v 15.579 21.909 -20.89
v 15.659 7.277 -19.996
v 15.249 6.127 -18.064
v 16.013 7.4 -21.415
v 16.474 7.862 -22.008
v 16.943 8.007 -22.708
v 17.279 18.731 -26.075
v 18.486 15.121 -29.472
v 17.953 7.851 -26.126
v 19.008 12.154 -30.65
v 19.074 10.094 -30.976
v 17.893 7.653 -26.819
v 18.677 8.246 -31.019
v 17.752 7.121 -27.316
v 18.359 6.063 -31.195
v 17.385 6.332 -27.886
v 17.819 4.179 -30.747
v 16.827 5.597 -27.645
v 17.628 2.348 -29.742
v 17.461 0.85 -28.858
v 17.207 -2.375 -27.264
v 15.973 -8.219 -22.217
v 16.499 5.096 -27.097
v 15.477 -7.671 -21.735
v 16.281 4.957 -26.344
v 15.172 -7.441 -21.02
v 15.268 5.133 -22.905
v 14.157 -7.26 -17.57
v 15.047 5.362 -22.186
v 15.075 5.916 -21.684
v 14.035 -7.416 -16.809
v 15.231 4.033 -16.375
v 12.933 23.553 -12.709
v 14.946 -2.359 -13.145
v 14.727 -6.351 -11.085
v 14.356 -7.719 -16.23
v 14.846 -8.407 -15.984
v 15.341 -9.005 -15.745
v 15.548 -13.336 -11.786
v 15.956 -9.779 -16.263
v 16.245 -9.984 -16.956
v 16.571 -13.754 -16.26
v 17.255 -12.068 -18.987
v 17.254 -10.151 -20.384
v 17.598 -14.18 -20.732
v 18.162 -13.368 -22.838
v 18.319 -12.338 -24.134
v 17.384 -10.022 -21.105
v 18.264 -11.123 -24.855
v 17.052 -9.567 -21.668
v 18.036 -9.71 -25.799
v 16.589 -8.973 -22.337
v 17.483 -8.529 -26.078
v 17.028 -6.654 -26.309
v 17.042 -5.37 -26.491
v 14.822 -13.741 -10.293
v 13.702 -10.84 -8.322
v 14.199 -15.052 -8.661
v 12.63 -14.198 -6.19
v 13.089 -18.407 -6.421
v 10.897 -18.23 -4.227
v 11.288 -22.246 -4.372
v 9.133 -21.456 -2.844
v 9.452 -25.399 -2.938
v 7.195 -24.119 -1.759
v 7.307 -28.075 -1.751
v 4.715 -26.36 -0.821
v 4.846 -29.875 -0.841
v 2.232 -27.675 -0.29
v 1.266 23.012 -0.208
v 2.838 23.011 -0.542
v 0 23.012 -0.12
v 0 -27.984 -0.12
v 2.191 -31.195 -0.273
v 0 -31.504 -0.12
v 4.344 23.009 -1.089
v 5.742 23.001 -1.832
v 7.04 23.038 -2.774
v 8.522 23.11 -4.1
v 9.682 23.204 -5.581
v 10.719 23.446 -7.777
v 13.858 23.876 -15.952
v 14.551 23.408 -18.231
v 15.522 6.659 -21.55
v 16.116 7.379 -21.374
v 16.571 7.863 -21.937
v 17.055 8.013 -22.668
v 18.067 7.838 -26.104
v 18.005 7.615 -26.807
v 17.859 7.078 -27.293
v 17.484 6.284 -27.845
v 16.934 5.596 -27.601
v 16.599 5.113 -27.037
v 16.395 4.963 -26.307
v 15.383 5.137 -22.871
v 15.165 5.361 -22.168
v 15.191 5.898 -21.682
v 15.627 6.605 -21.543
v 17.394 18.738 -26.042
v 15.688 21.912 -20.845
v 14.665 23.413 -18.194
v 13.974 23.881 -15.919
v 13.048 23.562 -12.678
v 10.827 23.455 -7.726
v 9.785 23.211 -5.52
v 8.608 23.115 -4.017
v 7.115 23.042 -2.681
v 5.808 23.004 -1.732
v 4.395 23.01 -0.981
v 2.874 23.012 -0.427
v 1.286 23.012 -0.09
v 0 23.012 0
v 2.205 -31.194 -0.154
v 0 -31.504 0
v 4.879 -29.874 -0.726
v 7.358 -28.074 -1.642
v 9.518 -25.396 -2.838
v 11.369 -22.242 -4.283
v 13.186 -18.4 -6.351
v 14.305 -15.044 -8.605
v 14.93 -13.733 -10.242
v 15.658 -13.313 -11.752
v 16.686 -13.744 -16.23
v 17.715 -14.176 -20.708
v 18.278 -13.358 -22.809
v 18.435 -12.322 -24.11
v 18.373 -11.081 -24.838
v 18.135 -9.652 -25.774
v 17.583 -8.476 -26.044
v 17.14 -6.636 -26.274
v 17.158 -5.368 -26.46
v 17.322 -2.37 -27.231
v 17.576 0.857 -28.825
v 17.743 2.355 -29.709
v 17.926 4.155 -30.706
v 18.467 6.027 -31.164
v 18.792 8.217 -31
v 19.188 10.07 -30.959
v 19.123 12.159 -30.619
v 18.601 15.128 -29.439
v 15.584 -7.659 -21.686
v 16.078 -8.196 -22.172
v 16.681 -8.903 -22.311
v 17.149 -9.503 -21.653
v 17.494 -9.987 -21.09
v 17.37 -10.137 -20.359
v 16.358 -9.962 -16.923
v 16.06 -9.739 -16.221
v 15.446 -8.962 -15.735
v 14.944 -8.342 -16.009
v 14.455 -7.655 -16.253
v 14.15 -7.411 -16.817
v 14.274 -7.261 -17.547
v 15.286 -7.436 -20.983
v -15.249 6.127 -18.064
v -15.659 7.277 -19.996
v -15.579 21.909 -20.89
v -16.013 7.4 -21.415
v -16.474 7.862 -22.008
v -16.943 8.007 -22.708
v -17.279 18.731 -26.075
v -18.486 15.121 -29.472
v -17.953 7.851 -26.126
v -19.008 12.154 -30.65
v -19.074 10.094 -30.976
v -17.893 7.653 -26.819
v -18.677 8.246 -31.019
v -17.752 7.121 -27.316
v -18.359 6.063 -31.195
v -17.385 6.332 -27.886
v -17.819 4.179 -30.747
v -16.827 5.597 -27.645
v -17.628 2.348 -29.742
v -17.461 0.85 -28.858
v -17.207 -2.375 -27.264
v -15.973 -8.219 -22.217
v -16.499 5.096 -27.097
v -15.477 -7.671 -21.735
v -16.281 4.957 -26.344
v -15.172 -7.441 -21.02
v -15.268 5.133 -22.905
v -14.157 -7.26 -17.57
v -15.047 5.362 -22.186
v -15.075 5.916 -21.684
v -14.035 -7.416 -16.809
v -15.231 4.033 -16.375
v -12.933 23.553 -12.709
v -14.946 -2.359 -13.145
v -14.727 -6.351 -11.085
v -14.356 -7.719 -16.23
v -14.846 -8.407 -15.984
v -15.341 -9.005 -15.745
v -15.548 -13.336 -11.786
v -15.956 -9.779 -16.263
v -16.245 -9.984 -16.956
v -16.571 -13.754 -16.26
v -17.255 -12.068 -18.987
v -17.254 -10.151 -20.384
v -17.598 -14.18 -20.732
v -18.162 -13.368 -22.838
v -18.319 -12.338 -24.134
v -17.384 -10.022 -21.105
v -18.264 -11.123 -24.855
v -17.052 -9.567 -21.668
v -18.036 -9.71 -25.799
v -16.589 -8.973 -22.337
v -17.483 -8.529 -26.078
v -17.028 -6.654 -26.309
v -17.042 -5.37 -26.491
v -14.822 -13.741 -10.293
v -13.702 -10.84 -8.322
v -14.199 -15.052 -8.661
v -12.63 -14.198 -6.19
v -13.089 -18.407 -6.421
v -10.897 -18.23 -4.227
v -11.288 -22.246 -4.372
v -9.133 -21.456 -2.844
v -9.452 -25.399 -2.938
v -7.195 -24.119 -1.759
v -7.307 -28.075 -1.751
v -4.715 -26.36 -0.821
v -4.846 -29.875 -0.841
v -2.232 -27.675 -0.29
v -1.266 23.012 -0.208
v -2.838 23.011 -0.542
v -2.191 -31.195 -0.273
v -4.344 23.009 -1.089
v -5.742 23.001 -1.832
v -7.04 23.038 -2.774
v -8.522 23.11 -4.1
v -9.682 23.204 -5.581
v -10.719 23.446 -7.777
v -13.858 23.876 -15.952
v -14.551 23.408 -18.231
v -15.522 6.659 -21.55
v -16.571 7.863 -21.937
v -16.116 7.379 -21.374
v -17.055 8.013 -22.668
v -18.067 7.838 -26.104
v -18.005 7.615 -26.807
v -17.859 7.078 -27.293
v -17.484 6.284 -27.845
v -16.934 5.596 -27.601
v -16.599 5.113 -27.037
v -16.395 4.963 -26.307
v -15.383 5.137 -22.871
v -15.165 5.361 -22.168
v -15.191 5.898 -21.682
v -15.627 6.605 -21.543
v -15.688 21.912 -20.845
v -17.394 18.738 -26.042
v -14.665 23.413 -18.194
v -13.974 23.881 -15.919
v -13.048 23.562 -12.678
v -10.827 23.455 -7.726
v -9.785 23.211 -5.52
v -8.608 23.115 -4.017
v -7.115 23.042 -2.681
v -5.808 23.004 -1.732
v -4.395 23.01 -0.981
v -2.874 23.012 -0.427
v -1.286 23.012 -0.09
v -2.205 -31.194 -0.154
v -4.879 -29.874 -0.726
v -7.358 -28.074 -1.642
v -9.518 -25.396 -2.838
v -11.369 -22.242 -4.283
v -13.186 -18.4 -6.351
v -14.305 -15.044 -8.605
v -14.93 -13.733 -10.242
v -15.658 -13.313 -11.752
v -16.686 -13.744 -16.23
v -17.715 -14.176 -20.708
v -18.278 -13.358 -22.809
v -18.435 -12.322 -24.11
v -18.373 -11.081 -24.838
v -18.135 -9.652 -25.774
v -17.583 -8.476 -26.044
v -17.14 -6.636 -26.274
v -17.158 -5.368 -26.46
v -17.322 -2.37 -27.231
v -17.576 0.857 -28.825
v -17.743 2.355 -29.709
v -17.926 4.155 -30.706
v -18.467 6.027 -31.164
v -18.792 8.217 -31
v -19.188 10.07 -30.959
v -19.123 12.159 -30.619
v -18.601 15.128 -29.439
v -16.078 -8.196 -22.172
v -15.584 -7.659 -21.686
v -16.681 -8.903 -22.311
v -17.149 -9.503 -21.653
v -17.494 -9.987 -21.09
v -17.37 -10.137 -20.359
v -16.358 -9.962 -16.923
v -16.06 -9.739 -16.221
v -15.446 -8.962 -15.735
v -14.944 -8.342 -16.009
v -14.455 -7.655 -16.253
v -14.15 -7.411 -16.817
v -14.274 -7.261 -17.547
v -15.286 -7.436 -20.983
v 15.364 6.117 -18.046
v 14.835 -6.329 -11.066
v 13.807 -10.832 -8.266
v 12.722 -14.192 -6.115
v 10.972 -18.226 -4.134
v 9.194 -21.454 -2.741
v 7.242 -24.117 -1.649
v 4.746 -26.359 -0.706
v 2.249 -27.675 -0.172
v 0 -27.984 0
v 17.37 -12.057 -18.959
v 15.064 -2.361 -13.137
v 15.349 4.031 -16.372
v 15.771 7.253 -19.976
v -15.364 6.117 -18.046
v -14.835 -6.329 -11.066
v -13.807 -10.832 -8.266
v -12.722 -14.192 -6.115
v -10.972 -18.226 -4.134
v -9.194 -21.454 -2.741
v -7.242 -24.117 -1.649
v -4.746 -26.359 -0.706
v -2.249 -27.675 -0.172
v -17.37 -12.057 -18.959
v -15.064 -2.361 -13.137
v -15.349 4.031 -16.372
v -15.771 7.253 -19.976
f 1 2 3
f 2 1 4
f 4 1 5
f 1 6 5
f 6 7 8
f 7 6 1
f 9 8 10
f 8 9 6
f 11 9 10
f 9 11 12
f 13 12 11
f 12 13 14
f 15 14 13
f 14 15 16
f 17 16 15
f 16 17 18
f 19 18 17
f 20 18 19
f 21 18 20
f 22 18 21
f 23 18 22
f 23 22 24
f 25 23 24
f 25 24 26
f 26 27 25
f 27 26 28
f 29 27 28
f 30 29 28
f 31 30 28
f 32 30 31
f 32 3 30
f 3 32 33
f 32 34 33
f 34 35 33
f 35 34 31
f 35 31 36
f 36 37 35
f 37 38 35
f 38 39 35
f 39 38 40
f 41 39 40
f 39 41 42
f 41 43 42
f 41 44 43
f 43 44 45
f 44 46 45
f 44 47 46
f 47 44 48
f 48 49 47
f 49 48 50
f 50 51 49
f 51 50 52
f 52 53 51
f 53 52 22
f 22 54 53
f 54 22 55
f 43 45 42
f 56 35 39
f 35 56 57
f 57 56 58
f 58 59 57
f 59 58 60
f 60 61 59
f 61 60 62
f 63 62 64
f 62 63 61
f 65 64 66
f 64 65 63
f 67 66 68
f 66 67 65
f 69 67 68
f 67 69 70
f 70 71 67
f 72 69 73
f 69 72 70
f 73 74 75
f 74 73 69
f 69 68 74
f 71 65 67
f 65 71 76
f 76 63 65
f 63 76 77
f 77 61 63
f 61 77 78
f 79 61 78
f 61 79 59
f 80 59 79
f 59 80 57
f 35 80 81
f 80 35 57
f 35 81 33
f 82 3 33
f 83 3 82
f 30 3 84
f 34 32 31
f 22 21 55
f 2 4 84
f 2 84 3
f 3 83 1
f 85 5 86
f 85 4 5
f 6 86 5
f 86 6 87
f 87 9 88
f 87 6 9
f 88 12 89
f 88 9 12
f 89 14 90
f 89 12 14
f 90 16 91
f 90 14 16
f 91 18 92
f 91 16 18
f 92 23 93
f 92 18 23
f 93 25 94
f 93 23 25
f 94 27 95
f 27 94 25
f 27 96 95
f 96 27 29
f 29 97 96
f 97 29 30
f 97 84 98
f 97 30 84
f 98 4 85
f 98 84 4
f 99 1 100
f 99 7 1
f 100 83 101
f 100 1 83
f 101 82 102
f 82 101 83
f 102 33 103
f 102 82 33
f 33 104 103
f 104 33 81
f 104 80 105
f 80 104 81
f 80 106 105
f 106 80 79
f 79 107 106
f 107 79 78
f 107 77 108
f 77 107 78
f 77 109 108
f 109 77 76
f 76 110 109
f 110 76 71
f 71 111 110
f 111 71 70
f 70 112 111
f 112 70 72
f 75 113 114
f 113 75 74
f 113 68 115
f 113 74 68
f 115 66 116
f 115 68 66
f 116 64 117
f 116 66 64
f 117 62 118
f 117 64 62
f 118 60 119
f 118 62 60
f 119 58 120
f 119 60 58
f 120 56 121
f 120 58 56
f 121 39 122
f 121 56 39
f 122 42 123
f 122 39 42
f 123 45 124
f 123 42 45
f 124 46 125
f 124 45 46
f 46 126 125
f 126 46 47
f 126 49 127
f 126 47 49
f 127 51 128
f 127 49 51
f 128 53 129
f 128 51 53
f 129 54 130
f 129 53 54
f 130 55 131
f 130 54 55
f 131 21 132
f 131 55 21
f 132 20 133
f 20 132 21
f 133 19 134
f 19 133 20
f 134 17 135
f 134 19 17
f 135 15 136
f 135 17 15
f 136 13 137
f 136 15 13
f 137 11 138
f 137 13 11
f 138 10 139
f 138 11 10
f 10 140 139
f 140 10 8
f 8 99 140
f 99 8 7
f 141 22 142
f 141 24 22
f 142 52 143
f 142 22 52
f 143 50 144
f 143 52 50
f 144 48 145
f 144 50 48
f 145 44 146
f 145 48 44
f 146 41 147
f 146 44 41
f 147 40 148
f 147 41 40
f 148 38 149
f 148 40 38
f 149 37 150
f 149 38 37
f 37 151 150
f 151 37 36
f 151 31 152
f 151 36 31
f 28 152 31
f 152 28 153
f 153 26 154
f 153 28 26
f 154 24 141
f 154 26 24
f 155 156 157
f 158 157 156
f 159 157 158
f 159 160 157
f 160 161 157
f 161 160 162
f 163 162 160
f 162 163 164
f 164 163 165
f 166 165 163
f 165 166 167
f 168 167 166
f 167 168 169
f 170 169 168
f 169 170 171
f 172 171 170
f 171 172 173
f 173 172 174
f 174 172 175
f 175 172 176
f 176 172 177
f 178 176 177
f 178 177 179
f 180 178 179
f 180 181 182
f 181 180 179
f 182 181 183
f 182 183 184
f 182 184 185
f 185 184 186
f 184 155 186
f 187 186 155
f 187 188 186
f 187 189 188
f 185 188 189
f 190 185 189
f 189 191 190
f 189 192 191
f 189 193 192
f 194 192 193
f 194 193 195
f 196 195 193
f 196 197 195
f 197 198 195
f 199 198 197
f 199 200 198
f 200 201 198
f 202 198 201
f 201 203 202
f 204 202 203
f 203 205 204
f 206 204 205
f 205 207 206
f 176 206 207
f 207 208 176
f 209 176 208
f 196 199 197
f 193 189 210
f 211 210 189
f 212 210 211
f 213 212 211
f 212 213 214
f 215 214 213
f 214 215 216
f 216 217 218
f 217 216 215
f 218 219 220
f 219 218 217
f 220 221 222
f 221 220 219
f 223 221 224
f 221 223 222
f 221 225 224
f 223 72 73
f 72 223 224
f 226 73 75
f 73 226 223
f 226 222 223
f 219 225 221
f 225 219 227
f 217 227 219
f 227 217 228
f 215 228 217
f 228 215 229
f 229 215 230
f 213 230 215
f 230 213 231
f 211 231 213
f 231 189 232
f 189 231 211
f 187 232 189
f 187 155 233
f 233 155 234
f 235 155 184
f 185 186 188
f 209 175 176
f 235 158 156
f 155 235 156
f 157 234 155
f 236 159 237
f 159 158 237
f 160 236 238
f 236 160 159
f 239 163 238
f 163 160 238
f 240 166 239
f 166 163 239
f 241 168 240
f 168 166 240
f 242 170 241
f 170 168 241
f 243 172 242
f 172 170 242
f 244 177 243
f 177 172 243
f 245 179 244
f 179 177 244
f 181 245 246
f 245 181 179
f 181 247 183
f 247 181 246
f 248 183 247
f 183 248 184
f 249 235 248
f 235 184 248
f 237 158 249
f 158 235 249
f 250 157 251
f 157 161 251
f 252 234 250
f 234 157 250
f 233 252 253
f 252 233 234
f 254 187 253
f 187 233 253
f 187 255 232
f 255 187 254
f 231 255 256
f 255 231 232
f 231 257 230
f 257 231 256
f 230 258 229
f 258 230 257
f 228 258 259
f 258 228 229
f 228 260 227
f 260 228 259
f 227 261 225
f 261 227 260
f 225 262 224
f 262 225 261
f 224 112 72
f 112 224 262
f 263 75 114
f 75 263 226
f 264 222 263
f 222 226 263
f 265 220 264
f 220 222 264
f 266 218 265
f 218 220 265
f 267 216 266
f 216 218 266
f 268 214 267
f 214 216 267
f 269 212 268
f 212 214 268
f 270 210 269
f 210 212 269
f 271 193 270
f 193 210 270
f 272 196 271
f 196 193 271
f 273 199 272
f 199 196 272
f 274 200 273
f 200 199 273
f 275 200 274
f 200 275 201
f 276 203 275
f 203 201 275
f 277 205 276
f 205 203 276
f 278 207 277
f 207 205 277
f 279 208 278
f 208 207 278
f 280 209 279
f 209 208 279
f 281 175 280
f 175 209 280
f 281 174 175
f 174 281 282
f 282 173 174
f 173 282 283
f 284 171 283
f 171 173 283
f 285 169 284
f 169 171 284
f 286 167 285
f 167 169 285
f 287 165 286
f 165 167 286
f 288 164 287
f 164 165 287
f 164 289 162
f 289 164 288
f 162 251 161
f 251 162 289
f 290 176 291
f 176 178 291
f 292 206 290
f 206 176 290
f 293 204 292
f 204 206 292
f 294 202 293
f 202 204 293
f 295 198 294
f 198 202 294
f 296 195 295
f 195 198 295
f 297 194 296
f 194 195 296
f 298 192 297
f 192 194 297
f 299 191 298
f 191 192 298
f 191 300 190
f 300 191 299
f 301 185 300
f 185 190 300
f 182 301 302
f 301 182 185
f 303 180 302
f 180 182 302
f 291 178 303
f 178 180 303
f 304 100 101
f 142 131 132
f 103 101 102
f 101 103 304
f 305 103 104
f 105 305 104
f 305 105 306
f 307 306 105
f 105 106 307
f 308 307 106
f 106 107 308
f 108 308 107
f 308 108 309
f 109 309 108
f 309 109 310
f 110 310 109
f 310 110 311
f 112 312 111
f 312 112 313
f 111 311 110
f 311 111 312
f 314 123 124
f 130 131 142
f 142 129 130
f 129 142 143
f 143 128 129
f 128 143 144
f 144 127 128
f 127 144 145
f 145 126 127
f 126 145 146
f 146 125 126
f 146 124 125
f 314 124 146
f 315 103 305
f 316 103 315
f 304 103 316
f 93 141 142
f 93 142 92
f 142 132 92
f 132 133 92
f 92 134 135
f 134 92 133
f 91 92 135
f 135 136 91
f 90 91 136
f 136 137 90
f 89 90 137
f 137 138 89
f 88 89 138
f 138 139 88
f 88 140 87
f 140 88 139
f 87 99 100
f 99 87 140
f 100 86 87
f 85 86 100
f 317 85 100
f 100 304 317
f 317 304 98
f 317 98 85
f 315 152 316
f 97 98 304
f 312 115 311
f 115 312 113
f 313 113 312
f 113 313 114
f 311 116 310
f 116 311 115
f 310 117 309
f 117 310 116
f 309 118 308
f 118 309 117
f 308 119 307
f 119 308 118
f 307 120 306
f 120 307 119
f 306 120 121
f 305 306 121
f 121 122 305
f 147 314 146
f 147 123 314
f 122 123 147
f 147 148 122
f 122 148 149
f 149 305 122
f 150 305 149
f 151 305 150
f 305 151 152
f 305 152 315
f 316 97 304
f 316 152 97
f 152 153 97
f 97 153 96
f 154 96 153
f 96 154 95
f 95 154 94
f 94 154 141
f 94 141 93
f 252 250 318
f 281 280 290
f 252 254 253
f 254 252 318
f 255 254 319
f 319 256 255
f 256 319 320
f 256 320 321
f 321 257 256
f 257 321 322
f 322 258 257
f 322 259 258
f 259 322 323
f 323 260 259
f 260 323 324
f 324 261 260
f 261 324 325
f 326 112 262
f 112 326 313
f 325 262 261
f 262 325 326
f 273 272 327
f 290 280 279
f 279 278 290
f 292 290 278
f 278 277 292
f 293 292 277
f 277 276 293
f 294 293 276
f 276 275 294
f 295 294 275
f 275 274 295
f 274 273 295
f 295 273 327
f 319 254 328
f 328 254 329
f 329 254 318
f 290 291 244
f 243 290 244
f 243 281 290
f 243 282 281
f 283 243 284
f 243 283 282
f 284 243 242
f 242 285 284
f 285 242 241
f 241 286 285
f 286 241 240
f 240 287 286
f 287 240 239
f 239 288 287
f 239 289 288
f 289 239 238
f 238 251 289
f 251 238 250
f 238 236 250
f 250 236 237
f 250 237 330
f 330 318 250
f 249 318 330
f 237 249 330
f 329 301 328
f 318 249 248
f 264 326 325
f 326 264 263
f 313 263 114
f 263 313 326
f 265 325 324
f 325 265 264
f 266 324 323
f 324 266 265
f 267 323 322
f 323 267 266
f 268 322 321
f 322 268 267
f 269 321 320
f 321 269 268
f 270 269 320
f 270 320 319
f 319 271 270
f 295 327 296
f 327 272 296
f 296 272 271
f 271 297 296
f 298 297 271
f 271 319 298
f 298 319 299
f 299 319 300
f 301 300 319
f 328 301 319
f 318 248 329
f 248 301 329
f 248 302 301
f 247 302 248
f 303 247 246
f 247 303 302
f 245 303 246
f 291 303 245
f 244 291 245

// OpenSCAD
use <../lib.scad>
use <s/67144c01s01.scad>
use <s/67144c01s02.scad>
use <s/67144c01s03.scad>
function ldraw_lib__67144c01() = [
// 0 Sheet Plastic  8.5 x  7 Motorcycle Windscreen (Formed)
// 0 Name: 67144c01.dat
// 0 Author: Philippe Hurbain [Philo]
// 0 !LDRAW_ORG Part UPDATE 2024-08
// 0 !LICENSE Licensed under CC BY 4.0 : see CAreadme.txt
// 
// 0 BFC CERTIFY CCW
  [0,"BFC","CERTIFY"],
  [0,"BFC","CCW"],
// 
// 0 !CATEGORY Sheet Plastic
// 0 !KEYWORDS bike, Ducati Panigale, Set 42107
// 
// 0 !HISTORY 2024-09-30 [OrionP] Official Update 2024-08
// 
// 
// 1 16 0 0 0 1 0 0 0 1 0 0 0 1 s\67144c01s01.dat
  [1,16,0,0,0,1,0,0,0,1,0,0,0,1, ldraw_lib__s__67144c01s01()],
// 1 16 0 0 0 -1 0 0 0 1 0 0 0 1 s\67144c01s01.dat
  [1,16,0,0,0,-1,0,0,0,1,0,0,0,1, ldraw_lib__s__67144c01s01()],
// 1 16 0 0 0 1 0 0 0 1 0 0 0 1 s\67144c01s02.dat
  [1,16,0,0,0,1,0,0,0,1,0,0,0,1, ldraw_lib__s__67144c01s02()],
// 1 16 0 0 0 1 0 0 0 1 0 0 0 1 s\67144c01s03.dat
  [1,16,0,0,0,1,0,0,0,1,0,0,0,1, ldraw_lib__s__67144c01s03()],
// 1 16 0 0 0 -1 0 0 0 1 0 0 0 1 s\67144c01s02.dat
  [1,16,0,0,0,-1,0,0,0,1,0,0,0,1, ldraw_lib__s__67144c01s02()],
// 1 16 0 0 0 -1 0 0 0 1 0 0 0 1 s\67144c01s03.dat
  [1,16,0,0,0,-1,0,0,0,1,0,0,0,1, ldraw_lib__s__67144c01s03()],
];
module ldraw_lib__67144c01(step=0, col=false, unit=2/5, alt=false, line=0.2, solid=!$preview)
    makepoly(ldraw_lib__67144c01(), step=step, col=col, unit=unit, alt=alt, line=line, solid=solid);
ldraw_lib__67144c01(line=0.2);
